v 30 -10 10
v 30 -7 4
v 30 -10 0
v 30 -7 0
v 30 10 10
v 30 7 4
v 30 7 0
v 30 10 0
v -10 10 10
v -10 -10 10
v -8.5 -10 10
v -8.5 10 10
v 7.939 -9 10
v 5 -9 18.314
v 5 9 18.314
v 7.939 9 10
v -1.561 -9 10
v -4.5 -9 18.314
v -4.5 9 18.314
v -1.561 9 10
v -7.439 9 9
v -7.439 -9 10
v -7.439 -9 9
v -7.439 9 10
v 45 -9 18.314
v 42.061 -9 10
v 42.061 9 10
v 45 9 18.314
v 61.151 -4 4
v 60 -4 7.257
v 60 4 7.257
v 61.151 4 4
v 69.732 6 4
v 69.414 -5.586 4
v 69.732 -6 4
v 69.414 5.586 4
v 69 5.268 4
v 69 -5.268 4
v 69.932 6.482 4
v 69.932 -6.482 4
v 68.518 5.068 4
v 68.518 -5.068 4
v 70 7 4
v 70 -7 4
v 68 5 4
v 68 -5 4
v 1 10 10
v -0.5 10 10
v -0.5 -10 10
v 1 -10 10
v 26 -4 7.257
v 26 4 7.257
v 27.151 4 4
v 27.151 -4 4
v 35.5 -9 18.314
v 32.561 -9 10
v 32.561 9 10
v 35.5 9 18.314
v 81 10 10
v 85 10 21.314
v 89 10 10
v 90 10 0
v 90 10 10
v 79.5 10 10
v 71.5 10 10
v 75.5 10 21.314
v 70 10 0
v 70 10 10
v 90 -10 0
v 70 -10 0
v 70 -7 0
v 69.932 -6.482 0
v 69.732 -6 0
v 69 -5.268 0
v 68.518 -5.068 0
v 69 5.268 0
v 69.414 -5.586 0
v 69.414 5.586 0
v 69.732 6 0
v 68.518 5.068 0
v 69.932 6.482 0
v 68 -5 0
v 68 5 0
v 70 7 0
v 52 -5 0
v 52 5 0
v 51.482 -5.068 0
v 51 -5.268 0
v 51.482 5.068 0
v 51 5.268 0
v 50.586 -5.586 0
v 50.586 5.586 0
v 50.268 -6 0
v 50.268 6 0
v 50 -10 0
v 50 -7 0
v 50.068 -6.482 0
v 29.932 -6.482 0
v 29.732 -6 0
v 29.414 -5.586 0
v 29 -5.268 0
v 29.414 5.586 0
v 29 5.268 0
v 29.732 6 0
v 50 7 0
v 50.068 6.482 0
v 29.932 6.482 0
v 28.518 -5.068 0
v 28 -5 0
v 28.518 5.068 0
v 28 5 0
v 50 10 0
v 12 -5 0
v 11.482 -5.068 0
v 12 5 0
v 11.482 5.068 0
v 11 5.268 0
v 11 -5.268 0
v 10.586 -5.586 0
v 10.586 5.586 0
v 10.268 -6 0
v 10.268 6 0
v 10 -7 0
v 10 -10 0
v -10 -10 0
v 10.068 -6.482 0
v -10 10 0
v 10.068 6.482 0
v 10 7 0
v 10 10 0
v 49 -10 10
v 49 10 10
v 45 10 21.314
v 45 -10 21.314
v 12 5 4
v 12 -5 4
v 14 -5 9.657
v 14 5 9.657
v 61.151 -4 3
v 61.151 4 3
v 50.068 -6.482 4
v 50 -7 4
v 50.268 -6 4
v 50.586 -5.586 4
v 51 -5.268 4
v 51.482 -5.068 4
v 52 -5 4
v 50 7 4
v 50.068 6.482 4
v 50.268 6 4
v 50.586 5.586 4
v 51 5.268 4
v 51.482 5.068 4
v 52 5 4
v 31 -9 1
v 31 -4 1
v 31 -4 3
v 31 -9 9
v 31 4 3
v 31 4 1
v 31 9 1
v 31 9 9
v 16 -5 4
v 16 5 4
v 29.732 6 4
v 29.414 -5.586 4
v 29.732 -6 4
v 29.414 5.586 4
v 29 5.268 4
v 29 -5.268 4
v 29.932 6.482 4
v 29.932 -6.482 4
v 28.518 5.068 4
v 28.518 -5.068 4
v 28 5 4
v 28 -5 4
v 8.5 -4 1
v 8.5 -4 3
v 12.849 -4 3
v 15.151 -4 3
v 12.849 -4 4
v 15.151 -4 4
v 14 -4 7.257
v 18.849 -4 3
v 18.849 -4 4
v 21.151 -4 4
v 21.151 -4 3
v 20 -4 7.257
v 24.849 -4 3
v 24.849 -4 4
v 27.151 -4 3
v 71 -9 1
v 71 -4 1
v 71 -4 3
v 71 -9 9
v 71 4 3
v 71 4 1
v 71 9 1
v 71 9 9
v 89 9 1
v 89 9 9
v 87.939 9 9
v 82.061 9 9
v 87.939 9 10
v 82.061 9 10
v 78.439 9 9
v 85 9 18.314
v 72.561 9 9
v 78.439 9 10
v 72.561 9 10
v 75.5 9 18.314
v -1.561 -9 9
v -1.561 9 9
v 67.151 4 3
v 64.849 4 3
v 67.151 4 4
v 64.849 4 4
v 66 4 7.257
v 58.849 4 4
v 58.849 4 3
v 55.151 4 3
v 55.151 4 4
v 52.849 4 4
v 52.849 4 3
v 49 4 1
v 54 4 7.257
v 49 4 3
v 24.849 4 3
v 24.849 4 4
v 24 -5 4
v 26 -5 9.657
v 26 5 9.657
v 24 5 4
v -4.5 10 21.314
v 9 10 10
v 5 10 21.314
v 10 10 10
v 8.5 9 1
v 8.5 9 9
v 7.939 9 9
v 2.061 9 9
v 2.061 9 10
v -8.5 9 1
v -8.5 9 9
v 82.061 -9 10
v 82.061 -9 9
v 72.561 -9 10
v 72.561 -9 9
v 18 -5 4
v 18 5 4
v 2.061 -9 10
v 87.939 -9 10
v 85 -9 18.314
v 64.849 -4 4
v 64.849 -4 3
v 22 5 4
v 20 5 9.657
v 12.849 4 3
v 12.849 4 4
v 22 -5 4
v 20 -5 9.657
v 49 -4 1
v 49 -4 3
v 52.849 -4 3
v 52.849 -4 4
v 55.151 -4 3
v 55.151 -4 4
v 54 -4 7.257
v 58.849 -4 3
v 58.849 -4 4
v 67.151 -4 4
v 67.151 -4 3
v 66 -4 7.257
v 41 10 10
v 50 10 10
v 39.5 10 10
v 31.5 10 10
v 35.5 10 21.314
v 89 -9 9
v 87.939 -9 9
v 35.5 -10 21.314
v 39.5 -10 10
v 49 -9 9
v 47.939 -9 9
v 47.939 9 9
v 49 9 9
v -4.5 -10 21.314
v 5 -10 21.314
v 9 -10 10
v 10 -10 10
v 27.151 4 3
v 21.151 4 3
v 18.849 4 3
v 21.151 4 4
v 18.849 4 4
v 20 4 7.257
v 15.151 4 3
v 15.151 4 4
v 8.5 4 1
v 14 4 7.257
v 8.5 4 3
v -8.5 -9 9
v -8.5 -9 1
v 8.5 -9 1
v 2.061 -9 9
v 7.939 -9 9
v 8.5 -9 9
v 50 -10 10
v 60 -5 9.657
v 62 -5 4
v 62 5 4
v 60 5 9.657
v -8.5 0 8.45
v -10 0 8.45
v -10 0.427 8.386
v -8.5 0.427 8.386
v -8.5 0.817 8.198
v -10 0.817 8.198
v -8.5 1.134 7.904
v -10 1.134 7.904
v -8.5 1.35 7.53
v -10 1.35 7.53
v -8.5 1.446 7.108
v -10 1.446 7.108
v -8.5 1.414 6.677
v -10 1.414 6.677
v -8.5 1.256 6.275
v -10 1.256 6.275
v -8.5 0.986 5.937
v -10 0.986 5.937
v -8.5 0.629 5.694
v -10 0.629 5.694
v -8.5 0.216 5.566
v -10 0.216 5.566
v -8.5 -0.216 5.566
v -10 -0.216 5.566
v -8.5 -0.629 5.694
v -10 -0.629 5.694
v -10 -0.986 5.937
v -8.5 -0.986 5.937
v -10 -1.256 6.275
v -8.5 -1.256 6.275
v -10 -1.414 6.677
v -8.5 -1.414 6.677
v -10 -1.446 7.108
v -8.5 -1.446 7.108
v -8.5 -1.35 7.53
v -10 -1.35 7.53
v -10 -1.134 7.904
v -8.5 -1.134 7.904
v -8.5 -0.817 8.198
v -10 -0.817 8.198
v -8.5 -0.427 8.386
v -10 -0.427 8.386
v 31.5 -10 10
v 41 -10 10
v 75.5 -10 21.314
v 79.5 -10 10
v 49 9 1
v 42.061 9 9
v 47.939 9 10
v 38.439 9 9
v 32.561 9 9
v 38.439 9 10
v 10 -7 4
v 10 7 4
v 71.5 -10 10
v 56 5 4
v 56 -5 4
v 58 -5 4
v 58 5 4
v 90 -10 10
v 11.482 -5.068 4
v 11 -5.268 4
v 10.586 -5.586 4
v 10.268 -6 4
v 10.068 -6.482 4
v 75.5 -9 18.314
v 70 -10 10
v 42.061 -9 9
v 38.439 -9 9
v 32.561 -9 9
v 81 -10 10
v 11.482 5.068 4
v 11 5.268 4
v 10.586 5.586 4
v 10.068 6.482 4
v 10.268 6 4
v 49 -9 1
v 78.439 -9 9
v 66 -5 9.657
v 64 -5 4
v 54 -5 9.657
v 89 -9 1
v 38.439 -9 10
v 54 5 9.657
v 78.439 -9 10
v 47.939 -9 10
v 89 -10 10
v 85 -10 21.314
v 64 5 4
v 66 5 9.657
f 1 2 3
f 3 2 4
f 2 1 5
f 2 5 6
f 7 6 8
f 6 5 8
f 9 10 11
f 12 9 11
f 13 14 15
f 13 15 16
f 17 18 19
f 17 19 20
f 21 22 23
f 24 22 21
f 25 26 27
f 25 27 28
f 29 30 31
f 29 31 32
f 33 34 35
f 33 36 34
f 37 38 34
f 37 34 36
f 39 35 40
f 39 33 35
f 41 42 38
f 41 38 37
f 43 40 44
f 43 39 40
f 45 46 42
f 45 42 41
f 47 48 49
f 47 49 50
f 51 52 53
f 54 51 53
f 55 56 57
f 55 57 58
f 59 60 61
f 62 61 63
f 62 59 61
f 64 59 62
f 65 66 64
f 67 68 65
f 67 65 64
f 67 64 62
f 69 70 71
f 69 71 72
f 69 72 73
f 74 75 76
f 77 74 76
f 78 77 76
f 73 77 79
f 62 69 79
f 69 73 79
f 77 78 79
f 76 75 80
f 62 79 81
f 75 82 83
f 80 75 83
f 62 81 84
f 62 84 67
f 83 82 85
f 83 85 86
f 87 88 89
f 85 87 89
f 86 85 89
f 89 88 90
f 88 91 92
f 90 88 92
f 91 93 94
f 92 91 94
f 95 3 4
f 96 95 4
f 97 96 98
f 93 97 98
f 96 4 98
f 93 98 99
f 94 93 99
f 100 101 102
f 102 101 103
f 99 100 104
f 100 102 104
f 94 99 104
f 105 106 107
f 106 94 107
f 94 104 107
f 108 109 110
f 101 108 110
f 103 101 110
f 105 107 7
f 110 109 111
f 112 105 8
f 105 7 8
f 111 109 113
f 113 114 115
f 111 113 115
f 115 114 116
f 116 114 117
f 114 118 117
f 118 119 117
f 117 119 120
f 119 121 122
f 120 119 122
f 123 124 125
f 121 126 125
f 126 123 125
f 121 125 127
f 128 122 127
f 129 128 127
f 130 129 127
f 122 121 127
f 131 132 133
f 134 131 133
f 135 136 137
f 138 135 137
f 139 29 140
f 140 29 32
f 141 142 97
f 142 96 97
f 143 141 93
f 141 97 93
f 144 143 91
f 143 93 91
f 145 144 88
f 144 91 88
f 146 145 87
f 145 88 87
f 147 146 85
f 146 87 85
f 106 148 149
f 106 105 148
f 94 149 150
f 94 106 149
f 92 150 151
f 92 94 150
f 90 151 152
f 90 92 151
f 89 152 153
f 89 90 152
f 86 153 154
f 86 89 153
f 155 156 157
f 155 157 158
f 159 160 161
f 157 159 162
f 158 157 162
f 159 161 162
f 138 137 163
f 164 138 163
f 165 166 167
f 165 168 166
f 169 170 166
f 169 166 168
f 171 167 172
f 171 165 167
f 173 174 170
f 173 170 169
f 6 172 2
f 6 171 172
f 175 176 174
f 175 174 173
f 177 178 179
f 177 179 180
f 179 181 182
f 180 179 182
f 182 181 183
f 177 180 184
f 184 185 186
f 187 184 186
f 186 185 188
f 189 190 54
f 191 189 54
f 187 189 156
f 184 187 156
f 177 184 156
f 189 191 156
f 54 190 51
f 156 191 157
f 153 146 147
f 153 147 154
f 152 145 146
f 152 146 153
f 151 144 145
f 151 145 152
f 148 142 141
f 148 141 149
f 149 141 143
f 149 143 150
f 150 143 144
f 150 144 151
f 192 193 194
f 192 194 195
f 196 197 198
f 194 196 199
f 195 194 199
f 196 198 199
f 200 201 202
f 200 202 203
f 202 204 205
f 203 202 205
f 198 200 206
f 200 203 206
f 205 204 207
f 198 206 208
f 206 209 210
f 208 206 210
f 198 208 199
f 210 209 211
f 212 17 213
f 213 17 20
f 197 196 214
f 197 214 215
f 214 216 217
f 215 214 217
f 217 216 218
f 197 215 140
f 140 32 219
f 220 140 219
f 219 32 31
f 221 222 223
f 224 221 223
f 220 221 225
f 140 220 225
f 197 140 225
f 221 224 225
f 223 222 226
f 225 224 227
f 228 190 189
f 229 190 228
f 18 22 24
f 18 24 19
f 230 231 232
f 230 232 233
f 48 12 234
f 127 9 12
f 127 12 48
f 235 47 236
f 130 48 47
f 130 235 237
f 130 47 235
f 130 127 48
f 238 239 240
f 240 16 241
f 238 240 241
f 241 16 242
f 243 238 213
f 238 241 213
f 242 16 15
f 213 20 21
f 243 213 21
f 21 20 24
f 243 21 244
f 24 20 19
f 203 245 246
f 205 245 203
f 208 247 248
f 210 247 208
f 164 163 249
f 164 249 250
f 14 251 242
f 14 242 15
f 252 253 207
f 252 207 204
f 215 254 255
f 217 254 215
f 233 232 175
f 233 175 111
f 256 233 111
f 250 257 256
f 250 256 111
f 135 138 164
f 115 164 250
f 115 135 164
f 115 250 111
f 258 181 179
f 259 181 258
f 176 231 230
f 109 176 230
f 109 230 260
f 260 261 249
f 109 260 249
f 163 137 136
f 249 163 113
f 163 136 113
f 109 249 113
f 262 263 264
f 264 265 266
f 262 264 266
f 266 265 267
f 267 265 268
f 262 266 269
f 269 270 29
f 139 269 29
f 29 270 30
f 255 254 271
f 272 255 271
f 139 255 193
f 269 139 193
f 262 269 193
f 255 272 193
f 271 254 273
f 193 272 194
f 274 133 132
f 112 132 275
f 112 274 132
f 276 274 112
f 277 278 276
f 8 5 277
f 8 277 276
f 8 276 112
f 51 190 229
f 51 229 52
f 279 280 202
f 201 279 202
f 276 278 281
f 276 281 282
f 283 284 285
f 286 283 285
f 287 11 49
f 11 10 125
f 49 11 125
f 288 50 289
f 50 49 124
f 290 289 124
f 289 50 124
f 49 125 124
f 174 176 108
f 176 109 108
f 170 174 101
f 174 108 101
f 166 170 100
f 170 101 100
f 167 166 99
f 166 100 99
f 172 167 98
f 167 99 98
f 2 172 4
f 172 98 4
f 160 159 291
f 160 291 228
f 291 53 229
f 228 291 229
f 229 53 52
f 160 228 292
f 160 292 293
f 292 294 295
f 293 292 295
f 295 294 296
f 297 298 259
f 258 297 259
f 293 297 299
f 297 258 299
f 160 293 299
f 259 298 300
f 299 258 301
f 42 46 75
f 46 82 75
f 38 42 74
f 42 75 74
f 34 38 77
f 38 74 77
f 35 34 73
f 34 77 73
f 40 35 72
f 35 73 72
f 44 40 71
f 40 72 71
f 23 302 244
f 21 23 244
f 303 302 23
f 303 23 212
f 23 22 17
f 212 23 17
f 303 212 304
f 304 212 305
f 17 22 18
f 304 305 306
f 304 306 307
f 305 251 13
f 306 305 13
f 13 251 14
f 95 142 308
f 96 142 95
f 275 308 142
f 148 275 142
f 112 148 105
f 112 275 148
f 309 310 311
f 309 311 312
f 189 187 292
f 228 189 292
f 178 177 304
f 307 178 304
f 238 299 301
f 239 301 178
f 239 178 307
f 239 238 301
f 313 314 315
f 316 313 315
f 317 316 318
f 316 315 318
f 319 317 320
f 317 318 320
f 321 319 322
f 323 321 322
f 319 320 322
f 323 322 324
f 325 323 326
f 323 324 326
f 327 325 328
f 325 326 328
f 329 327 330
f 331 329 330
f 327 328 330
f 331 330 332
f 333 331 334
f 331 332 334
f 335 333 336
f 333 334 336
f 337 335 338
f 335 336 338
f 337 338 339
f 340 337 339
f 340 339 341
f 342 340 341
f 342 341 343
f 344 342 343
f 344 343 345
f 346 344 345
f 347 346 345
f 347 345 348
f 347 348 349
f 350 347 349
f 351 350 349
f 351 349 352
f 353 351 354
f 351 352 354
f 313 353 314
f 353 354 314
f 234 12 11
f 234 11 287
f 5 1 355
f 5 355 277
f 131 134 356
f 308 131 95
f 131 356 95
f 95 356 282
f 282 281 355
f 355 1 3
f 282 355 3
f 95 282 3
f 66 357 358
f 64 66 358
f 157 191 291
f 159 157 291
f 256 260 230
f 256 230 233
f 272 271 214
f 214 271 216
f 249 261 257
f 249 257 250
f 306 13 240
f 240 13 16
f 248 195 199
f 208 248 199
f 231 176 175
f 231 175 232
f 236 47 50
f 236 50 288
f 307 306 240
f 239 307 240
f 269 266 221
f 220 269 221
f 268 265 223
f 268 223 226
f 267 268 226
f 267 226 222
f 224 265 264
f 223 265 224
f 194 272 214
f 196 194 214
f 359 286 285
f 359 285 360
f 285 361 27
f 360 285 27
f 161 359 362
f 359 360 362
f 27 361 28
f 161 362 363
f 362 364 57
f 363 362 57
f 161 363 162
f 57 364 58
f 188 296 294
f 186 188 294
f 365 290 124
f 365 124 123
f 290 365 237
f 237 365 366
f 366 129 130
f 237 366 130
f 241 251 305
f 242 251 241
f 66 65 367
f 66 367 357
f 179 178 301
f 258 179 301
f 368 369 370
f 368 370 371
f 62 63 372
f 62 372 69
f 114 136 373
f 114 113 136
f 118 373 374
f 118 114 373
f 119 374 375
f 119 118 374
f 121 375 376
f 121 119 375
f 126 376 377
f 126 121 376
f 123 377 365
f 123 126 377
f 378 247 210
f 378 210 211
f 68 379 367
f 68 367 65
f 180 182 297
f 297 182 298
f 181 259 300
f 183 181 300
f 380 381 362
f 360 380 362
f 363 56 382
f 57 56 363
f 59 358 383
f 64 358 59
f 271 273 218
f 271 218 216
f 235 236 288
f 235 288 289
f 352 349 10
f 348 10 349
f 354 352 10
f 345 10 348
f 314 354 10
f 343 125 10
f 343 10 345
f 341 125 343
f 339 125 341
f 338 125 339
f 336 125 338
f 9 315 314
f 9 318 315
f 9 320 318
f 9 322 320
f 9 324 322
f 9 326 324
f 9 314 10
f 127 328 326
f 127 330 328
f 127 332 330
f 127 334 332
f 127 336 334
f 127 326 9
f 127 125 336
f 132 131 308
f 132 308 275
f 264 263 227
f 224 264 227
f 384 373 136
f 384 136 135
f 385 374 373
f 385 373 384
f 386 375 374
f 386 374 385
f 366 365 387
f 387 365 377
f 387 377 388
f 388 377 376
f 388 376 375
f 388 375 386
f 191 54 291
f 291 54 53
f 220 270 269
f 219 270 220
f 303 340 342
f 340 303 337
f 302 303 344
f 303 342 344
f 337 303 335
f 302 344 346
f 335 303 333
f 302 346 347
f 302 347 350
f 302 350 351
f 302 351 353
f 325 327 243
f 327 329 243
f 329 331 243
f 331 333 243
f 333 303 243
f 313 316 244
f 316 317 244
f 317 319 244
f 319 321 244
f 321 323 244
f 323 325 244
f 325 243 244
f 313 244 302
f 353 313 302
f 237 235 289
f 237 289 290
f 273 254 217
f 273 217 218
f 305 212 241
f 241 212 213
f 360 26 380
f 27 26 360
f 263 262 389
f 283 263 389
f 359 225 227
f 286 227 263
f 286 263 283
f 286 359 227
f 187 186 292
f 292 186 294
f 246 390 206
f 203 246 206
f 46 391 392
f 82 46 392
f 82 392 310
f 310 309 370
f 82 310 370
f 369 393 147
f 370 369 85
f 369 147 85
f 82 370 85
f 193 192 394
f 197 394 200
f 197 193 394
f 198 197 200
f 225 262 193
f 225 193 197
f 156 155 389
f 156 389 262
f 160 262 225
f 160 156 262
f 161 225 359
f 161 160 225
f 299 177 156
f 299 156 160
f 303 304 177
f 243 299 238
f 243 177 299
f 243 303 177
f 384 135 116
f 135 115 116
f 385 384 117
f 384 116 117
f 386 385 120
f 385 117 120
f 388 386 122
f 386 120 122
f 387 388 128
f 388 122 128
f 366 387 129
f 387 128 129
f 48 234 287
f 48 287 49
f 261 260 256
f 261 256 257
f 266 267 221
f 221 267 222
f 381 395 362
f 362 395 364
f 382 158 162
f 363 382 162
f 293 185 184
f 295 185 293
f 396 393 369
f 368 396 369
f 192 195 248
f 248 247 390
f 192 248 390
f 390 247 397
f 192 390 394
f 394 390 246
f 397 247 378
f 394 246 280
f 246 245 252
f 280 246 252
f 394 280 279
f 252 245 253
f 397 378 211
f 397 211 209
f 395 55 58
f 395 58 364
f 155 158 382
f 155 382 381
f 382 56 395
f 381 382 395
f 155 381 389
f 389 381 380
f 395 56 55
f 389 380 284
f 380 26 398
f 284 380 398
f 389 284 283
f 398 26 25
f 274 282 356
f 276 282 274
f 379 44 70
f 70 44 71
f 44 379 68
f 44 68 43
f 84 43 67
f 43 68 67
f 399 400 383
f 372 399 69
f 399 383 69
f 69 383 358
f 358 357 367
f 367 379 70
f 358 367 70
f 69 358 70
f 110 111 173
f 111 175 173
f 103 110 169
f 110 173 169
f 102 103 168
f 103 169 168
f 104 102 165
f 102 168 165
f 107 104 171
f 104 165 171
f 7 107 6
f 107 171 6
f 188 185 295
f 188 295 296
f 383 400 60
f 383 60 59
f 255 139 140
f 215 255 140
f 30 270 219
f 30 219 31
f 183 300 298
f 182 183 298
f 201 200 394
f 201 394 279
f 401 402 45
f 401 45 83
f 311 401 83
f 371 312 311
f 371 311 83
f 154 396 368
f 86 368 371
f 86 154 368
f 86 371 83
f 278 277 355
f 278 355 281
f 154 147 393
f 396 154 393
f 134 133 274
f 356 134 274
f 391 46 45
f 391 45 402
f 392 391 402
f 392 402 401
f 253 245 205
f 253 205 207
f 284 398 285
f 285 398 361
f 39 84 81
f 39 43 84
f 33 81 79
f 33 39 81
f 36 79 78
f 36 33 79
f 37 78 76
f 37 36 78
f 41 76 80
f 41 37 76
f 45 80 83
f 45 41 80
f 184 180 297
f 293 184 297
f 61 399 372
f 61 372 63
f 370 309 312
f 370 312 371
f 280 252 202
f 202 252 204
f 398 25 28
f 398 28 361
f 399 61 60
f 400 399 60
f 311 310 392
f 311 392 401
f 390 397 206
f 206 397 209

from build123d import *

# Parameters (mm, degrees)
SKETCH1_W            = 20
SKETCH1_H            = 20
BOSS_EXTRUDE1_DEPTH  = 10
SKETCH2_W            = 4
SKETCH2_H            = 10
BOSS_EXTRUDE2_DEPTH  = 20
SKETCH3_W            = 10
SKETCH3_H            = 20
BOSS_EXTRUDE3_DEPTH  = 20
SKETCH4_W            = 4
SKETCH4_H            = 10
BOSS_EXTRUDE4_DEPTH  = 20
SKETCH5_W            = 10
SKETCH5_H            = 20
BOSS_EXTRUDE5_DEPTH  = 20
BOSS_EXTRUDE6_DEPTH  = 20
BOSS_EXTRUDE7_DEPTH  = 20
BOSS_EXTRUDE8_DEPTH  = 10
SKETCH9_R            = 1.45
CUT_EXTRUDE1_DEPTH   = 1.5
SKETCH10_W           = 8
SKETCH10_H           = 18
CUT_EXTRUDE2_DEPTH   = 17
SKETCH13_W           = 8
SKETCH13_H           = 18
CUT_EXTRUDE4_DEPTH   = 19
SKETCH14_W           = 10
SKETCH14_H           = 20
BOSS_EXTRUDE9_DEPTH  = 1
SKETCH15_W           = 8
SKETCH15_H           = 18
CUT_EXTRUDE5_DEPTH   = 19
SKETCH16_W           = 10
SKETCH16_H           = 20
BOSS_EXTRUDE10_DEPTH = 1
SKETCH12_W           = 2
SKETCH12_H           = 8
CUT_EXTRUDE3_DEPTH   = 80
CUT_EXTRUDE7_DEPTH   = 19
SKETCH19_W           = 5.878679656
SKETCH19_H           = 18
CUT_EXTRUDE8_DEPTH   = 5
BOSS_EXTRUDE12_DEPTH = 1
CUT_EXTRUDE10_DEPTH  = 9
SKETCH23_W           = 2.302943726
SKETCH23_H           = 8
CUT_EXTRUDE11_DEPTH  = 3
BOSS_EXTRUDE13_DEPTH = 1
FILLET3_R            = 2
FILLET4_R            = 2


with BuildPart() as part:
    # Sketch1 → Boss-Extrude1 (new body)
    with BuildSketch(Plane.XY):
        Rectangle(SKETCH1_W, SKETCH1_H)
    extrude(amount=BOSS_EXTRUDE1_DEPTH)

    # Sketch2 → Boss-Extrude2 (add)
    with BuildSketch(Plane(origin=(10, 0, 0), x_dir=(0, 0, -1), z_dir=(1, 0, 0))):
        with Locations((-2, 0)):
            Rectangle(SKETCH2_W, SKETCH2_H)
    extrude(amount=BOSS_EXTRUDE2_DEPTH)

    # Sketch3 → Boss-Extrude3 (add)
    with BuildSketch(Plane(origin=(30, 0, 0), x_dir=(0, 0, -1), z_dir=(1, 0, 0))):
        with Locations((-5, 0)):
            Rectangle(SKETCH3_W, SKETCH3_H)
    extrude(amount=BOSS_EXTRUDE3_DEPTH)

    # Sketch4 → Boss-Extrude4 (add)
    with BuildSketch(Plane(origin=(50, 0, 0), x_dir=(0, 0, -1), z_dir=(1, 0, 0))):
        with Locations((-2, 0)):
            Rectangle(SKETCH4_W, SKETCH4_H)
    extrude(amount=BOSS_EXTRUDE4_DEPTH)

    # Sketch5 → Boss-Extrude5 (add)
    with BuildSketch(Plane(origin=(70, 0, 0), x_dir=(0, 0, -1), z_dir=(1, 0, 0))):
        with Locations((-5, 0)):
            Rectangle(SKETCH5_W, SKETCH5_H)
    extrude(amount=BOSS_EXTRUDE5_DEPTH)

    # Sketch6 → Boss-Extrude6 (add)
    with BuildSketch(Plane.XZ.offset(10)):
        Polygon((-8.5, 10), (-4.5, 21.313708499), (-0.5, 10), align=None)
        Polygon((9, 10), (1, 10), (5, 21.313708499), align=None)
    extrude(amount=-BOSS_EXTRUDE6_DEPTH)

    # Sketch7 → Boss-Extrude7 (add)
    with BuildSketch(Plane.XZ.offset(10)):
        Polygon((31.5, 10), (35.5, 21.313708499), (39.5, 10), align=None)
        Polygon((71.5, 10), (75.5, 21.313708499), (79.5, 10), align=None)
        Polygon((41, 10), (49, 10), (45, 21.313708499), align=None)
        Polygon((81, 10), (89, 10), (85, 21.313708499), align=None)
    extrude(amount=-BOSS_EXTRUDE7_DEPTH)

    # Sketch8 → Boss-Extrude8 (add)
    with BuildSketch(Plane.XZ.offset(5)):
        Polygon((12, 4), (14, 9.656854249), (16, 4), align=None)
        Polygon((52, 4), (54, 9.656854249), (56, 4), align=None)
        Polygon((18, 4), (22, 4), (20, 9.656854249), align=None)
        Polygon((58, 4), (62, 4), (60, 9.656854249), align=None)
        Polygon((24, 4), (28, 4), (26, 9.656854249), align=None)
        Polygon((64, 4), (68, 4), (66, 9.656854249), align=None)
    extrude(amount=-BOSS_EXTRUDE8_DEPTH)

    # Sketch9 → Cut-Extrude1 (cut)
    with BuildSketch(Plane.ZY.offset(10)):
        with Locations((7, 0)):
            Circle(SKETCH9_R)
    extrude(amount=-CUT_EXTRUDE1_DEPTH, mode=Mode.SUBTRACT)

    # Sketch10 → Cut-Extrude2 (cut)
    with BuildSketch(Plane.ZY.offset(8.5)):
        with Locations((5, 0)):
            Rectangle(SKETCH10_W, SKETCH10_H)
    extrude(amount=-CUT_EXTRUDE2_DEPTH, mode=Mode.SUBTRACT)

    # Sketch13 → Cut-Extrude4 (cut)
    with BuildSketch(Plane.ZY.offset(-30)):
        with Locations((5, 0)):
            Rectangle(SKETCH13_W, SKETCH13_H)
    extrude(amount=-CUT_EXTRUDE4_DEPTH, mode=Mode.SUBTRACT)

    # Sketch14 → Boss-Extrude9 (add)
    with BuildSketch(Plane.ZY.offset(-30)):
        with Locations((5, 0)):
            Rectangle(SKETCH14_W, SKETCH14_H)
    extrude(amount=-BOSS_EXTRUDE9_DEPTH)

    # Sketch15 → Cut-Extrude5 (cut)
    with BuildSketch(Plane.ZY.offset(-70)):
        with Locations((5, 0)):
            Rectangle(SKETCH15_W, SKETCH15_H)
    extrude(amount=-CUT_EXTRUDE5_DEPTH, mode=Mode.SUBTRACT)

    # Sketch16 → Boss-Extrude10 (add)
    with BuildSketch(Plane.ZY.offset(-70)):
        with Locations((5, 0)):
            Rectangle(SKETCH16_W, SKETCH16_H)
    extrude(amount=-BOSS_EXTRUDE10_DEPTH)

    # Sketch12 → Cut-Extrude3 (cut)
    with BuildSketch(Plane.ZY.offset(-8.5)):
        with Locations((2, 0)):
            Rectangle(SKETCH12_W, SKETCH12_H)
    extrude(amount=-CUT_EXTRUDE3_DEPTH, mode=Mode.SUBTRACT)

    # Sketch17 → Cut-Extrude7 (cut)
    with BuildSketch(Plane.XZ.offset(10)):
        Polygon((-7.439339828, 10), (-4.5, 18.313708499), (-1.560660172, 10), align=None)
        Polygon((32.560660172, 10), (35.5, 18.313708499), (38.439339828, 10), align=None)
        Polygon((72.560660172, 10), (75.5, 18.313708499), (78.439339828, 10), align=None)
        Polygon((7.939339828, 10), (2.060660172, 10), (5, 18.313708499), align=None)
        Polygon((47.939339828, 10), (42.060660172, 10), (45, 18.313708499), align=None)
        Polygon((87.939339828, 10), (82.060660172, 10), (85, 18.313708499), align=None)
    extrude(amount=-CUT_EXTRUDE7_DEPTH, mode=Mode.SUBTRACT)

    # Sketch19 → Cut-Extrude8 (cut)
    with BuildSketch(Plane.XY.offset(10)):
        with Locations((-4.5, 0)):
            Rectangle(SKETCH19_W, SKETCH19_H)
        with Locations((35.5, 0)):
            Rectangle(SKETCH19_W, SKETCH19_H)
        with Locations((75.5, 0)):
            Rectangle(SKETCH19_W, SKETCH19_H)
        with Locations((5, 0)):
            Rectangle(SKETCH19_W, SKETCH19_H)
        with Locations((45, 0)):
            Rectangle(SKETCH19_W, SKETCH19_H)
        with Locations((85, 0)):
            Rectangle(SKETCH19_W, SKETCH19_H)
    extrude(amount=-CUT_EXTRUDE8_DEPTH, mode=Mode.SUBTRACT)

    # Sketch21 → Boss-Extrude12 (add)
    with BuildSketch(Plane.XZ.offset(10)):
        Polygon((-8.5, 10), (-4.5, 21.313708499), (-0.5, 10), align=None)
        Polygon((31.5, 10), (35.5, 21.313708499), (39.5, 10), align=None)
        Polygon((71.5, 10), (75.5, 21.313708499), (79.5, 10), align=None)
        Polygon((9, 10), (1, 10), (5, 21.313708499), align=None)
        Polygon((49, 10), (41, 10), (45, 21.313708499), align=None)
        Polygon((81, 10), (89, 10), (85, 21.313708499), align=None)
    extrude(amount=-BOSS_EXTRUDE12_DEPTH)

    # Sketch22 → Cut-Extrude10 (cut)
    with BuildSketch(Plane.XZ.offset(5)):
        Polygon((12.848528137, 4), (14, 7.256854249), (15.151471863, 4), align=None)
        Polygon((52.848528137, 4), (54, 7.256854249), (55.151471863, 4), align=None)
        Polygon((21.151471863, 4), (18.848528137, 4), (20, 7.256854249), align=None)
        Polygon((61.151471863, 4), (58.848528137, 4), (60, 7.256854249), align=None)
        Polygon((27.151471863, 4), (24.848528137, 4), (26, 7.256854249), align=None)
        Polygon((67.151471863, 4), (64.848528137, 4), (66, 7.256854249), align=None)
    extrude(amount=-CUT_EXTRUDE10_DEPTH, mode=Mode.SUBTRACT)

    # Sketch23 → Cut-Extrude11 (cut)
    with BuildSketch(Plane.XY.offset(4)):
        with Locations((14, 0)):
            Rectangle(SKETCH23_W, SKETCH23_H)
        with Locations((54, 0)):
            Rectangle(SKETCH23_W, SKETCH23_H)
        with Locations((20, 0)):
            Rectangle(SKETCH23_W, SKETCH23_H)
        with Locations((60, 0)):
            Rectangle(SKETCH23_W, SKETCH23_H)
        with Locations((26, 0)):
            Rectangle(SKETCH23_W, SKETCH23_H)
        with Locations((66, 0)):
            Rectangle(SKETCH23_W, SKETCH23_H)
    extrude(amount=-CUT_EXTRUDE11_DEPTH, mode=Mode.SUBTRACT)

    # Sketch24 → Boss-Extrude13 (add)
    with BuildSketch(Plane.XZ.offset(5)):
        Polygon((12, 4), (14, 9.656854249), (16, 4), align=None)
        Polygon((52, 4), (54, 9.656854249), (56, 4), align=None)
        Polygon((22, 4), (18, 4), (20, 9.656854249), align=None)
        Polygon((62, 4), (58, 4), (60, 9.656854249), align=None)
        Polygon((28, 4), (24, 4), (26, 9.656854249), align=None)
        Polygon((68, 4), (64, 4), (66, 9.656854249), align=None)
    extrude(amount=-BOSS_EXTRUDE13_DEPTH)

    # Fillet3
    fillet3_edges = [part.edges().sort_by_distance(p)[0] for p in [
        (10, -5, 2),
    ]]
    fillet(fillet3_edges, radius=FILLET3_R)

    # Fillet4
    fillet4_edges = [part.edges().sort_by_distance(p)[0] for p in [
        (30, 5, 2),
        (50, 5, 2),
        (10, 5, 2),
        (70, 5, 2),
        (50, -5, 2),
        (70, -5, 2),
        (30, -5, 2),
    ]]
    fillet(fillet4_edges, radius=FILLET4_R)


solid = part.part
